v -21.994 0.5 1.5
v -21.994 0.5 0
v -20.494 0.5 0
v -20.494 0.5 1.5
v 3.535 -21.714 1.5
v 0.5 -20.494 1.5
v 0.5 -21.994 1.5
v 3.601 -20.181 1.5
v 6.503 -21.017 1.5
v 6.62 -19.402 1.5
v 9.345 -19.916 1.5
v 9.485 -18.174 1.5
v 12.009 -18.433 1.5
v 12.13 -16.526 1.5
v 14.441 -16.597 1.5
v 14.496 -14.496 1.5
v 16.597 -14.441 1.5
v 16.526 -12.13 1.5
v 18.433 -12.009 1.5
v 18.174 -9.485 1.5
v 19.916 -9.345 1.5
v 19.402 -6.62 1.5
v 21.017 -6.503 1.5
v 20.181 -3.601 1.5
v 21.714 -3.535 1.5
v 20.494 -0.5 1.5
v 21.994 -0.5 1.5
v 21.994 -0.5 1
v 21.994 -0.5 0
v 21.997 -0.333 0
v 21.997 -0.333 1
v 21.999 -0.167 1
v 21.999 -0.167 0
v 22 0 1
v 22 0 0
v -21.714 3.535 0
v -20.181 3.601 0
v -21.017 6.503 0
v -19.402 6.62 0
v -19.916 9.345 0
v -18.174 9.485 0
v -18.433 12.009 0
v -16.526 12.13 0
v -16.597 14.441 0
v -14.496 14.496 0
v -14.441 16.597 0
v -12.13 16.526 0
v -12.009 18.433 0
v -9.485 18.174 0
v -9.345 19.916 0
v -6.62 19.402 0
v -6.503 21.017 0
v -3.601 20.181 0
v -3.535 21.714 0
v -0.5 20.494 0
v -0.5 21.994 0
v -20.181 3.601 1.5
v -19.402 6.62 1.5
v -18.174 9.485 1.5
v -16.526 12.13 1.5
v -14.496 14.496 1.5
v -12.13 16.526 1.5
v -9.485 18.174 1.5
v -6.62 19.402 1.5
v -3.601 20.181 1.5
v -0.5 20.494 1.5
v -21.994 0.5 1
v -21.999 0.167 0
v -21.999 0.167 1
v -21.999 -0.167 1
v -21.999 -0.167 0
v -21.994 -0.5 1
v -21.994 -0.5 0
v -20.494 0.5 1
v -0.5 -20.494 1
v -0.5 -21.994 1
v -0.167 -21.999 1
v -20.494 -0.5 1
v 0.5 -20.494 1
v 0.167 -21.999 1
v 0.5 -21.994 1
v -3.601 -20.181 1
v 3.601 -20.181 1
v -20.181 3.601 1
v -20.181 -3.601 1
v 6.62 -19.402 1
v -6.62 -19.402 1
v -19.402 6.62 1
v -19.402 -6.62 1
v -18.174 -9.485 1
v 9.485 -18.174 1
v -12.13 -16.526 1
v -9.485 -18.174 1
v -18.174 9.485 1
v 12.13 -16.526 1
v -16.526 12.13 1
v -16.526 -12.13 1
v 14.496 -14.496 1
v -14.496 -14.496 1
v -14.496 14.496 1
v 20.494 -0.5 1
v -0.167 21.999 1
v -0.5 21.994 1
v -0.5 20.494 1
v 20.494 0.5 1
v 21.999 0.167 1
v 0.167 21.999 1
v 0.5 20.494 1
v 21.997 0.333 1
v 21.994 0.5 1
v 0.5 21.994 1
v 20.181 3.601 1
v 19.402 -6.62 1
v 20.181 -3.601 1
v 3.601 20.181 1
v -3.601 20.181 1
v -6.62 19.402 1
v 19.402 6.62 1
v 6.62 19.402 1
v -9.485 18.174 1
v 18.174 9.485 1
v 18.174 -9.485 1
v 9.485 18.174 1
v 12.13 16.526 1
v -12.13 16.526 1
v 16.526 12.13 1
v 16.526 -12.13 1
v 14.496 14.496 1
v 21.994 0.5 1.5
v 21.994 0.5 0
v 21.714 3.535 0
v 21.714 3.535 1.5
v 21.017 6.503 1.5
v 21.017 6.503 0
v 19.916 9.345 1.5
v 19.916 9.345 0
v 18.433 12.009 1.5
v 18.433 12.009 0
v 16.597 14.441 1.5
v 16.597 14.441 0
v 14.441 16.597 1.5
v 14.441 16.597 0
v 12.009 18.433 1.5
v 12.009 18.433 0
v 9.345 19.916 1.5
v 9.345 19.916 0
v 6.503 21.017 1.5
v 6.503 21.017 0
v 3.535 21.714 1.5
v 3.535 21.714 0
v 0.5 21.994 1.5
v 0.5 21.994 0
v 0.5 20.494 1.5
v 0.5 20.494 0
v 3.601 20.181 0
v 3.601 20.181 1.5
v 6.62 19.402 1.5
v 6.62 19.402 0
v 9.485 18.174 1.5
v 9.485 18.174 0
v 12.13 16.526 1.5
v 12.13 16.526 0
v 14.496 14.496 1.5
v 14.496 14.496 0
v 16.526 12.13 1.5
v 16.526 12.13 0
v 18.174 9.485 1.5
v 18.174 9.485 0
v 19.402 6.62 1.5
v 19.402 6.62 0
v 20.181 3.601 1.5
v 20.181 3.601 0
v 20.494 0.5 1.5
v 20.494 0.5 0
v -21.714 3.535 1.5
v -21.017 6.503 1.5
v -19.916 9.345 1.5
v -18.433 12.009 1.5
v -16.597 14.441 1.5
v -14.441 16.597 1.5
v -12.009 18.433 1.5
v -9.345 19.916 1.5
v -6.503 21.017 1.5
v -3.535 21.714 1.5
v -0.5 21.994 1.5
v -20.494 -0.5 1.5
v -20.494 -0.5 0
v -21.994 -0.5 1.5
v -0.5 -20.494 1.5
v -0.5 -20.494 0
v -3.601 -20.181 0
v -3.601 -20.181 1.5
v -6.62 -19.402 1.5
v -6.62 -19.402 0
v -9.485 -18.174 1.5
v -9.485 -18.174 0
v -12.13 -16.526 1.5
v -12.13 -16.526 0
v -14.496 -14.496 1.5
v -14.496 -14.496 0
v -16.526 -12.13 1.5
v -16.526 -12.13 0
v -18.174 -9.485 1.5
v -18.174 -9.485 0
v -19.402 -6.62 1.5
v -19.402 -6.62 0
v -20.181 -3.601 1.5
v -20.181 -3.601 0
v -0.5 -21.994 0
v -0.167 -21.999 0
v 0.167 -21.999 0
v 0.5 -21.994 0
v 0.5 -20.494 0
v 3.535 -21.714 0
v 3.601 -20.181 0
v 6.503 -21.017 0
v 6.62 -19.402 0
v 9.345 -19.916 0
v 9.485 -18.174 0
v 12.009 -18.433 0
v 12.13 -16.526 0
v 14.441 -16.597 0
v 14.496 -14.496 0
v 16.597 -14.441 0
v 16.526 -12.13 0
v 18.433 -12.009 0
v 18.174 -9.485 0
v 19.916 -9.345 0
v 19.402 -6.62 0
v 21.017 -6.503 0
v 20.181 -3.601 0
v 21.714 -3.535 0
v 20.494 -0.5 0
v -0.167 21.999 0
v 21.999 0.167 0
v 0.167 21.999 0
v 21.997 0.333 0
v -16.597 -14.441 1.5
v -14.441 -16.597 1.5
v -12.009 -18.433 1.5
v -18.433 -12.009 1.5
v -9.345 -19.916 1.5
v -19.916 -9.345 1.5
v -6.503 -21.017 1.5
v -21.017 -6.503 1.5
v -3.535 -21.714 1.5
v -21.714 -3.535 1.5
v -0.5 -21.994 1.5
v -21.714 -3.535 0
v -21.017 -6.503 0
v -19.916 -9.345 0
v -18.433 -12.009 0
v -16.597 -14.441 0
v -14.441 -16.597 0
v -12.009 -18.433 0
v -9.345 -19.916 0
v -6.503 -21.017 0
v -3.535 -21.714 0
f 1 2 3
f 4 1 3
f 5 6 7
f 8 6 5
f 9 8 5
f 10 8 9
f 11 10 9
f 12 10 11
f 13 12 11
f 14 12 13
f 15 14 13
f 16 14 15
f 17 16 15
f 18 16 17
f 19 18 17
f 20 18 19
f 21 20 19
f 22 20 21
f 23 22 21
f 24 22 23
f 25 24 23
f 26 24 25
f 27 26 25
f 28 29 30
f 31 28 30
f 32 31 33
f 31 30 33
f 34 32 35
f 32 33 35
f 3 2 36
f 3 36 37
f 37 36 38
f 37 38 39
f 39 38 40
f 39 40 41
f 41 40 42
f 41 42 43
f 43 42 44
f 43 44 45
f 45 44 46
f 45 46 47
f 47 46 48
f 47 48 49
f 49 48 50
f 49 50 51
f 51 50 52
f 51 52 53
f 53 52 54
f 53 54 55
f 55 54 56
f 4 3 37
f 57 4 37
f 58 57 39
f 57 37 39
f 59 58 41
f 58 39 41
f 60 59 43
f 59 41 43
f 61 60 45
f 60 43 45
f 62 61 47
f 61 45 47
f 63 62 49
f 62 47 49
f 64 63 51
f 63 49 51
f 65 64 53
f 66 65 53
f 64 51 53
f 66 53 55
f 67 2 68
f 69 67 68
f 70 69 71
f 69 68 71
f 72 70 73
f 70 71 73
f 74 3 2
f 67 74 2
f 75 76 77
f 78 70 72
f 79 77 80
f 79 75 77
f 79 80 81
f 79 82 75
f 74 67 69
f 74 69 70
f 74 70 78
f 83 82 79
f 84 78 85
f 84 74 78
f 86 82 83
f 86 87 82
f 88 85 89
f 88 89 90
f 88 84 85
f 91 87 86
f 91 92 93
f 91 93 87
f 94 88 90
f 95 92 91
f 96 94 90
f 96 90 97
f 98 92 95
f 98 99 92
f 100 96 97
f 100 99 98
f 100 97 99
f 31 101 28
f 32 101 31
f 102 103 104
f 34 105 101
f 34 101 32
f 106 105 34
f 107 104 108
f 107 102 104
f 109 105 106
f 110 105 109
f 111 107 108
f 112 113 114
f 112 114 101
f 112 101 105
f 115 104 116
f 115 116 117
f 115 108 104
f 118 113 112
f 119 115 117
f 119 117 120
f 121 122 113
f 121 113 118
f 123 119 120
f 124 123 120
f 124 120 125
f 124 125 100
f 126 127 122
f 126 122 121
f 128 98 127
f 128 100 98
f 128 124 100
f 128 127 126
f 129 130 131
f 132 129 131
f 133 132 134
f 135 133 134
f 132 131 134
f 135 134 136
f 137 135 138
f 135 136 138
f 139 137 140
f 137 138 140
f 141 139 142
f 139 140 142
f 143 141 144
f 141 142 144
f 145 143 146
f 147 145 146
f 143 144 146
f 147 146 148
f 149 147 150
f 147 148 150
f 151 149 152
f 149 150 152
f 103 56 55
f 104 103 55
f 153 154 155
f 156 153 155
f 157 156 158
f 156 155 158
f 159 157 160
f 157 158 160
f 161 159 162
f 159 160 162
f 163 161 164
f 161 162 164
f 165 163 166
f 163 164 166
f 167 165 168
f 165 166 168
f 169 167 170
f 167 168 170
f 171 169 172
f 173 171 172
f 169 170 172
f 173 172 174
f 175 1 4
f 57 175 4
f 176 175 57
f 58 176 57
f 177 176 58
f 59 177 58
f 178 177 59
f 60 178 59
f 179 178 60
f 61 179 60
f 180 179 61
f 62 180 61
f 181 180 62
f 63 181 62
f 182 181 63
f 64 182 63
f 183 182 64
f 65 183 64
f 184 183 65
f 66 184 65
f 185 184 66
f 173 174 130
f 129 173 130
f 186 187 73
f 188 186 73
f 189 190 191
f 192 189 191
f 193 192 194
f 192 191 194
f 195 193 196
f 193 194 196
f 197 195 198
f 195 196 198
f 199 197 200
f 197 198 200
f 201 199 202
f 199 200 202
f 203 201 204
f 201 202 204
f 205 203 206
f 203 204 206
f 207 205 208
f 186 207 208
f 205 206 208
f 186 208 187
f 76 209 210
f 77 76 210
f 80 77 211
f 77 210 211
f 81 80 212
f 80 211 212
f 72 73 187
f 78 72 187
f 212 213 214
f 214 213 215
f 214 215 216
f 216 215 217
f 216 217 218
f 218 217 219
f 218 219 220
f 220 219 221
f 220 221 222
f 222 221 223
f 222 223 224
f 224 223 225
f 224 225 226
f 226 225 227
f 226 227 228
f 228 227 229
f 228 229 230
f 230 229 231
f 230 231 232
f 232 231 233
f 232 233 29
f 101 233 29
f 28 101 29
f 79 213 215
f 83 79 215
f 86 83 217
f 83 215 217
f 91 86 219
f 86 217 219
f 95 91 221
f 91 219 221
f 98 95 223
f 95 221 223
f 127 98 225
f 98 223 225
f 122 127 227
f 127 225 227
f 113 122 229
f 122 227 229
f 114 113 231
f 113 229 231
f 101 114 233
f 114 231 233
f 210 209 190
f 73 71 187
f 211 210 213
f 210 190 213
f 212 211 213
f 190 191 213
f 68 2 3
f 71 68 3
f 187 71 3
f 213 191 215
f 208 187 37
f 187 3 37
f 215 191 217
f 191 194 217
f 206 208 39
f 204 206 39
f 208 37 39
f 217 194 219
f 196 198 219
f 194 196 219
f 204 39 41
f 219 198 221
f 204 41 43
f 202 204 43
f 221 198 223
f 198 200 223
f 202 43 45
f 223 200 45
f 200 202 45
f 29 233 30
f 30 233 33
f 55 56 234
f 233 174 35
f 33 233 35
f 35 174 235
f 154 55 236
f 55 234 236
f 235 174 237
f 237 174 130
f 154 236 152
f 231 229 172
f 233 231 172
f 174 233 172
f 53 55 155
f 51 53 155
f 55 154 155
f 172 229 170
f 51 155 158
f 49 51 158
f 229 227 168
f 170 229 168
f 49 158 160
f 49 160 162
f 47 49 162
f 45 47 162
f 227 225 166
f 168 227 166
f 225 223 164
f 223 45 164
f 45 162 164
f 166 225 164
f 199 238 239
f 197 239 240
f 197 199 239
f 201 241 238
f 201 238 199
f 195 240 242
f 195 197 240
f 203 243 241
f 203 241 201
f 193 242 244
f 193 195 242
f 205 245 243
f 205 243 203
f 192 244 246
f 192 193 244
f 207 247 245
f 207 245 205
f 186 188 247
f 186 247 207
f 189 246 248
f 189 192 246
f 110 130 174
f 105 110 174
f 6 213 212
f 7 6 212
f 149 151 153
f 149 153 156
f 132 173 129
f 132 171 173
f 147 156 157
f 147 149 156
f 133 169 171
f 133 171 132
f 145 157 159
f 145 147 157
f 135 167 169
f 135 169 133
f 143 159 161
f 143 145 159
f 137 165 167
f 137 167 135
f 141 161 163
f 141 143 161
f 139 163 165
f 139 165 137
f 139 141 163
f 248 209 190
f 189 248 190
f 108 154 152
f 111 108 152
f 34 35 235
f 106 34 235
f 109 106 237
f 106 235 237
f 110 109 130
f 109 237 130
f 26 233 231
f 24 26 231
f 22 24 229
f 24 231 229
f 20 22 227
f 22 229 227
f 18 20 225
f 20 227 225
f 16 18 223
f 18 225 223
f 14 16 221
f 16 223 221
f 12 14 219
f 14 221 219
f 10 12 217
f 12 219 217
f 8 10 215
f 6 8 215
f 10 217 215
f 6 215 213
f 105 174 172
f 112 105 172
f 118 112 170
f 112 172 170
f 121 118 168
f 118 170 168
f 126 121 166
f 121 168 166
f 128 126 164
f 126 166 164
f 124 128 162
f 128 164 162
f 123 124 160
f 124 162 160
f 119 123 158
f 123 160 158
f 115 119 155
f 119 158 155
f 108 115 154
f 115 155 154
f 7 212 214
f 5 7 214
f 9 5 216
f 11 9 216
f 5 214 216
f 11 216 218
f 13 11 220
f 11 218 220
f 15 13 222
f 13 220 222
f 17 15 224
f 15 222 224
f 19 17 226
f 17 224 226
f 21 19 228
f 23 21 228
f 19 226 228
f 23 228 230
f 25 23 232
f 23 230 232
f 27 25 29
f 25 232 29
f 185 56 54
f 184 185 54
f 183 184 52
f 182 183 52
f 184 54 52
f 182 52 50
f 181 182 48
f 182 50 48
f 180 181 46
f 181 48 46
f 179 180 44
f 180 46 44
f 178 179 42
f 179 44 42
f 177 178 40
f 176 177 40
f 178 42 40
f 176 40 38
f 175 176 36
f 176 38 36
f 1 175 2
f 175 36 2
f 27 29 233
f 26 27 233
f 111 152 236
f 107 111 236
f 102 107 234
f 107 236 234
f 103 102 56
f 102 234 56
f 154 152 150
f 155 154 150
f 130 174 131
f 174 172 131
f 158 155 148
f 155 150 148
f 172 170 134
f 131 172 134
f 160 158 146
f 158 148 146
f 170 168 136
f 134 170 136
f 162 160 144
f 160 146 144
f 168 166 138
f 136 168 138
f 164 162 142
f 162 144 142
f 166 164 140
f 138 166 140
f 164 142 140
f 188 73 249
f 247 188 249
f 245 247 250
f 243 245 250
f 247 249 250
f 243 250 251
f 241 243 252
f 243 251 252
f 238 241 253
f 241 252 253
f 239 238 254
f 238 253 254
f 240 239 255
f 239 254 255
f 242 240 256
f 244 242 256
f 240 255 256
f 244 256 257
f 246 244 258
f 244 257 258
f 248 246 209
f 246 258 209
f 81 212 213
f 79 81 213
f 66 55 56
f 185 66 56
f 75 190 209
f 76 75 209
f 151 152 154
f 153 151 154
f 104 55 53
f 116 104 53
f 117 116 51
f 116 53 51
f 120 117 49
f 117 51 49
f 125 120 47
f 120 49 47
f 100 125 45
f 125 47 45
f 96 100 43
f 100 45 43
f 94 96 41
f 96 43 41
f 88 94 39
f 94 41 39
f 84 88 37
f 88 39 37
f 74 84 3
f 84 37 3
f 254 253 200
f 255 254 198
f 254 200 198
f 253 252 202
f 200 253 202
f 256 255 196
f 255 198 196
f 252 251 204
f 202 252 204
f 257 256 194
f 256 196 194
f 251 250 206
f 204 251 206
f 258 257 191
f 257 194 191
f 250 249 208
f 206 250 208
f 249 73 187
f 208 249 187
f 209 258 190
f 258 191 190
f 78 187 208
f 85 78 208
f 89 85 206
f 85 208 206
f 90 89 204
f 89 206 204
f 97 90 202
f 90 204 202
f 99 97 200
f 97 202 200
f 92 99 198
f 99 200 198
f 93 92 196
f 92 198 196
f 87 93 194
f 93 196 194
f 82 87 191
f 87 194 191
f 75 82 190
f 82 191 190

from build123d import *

# Parameters (mm, degrees)
F1_DEPTH = 1.5
F2_DEPTH = 1


with BuildPart() as f1:
    # F0 (on Top) → F1 (new body)
    with BuildSketch(Plane.XY):
        with BuildLine():
            Line((-0.5, 20.493902), (-0.5, 21.994317))
            ThreePointArc((-0.5, 21.994317), (-15.556349, 15.556349), (-21.994317, 0.5))
            Line((-21.994317, 0.5), (-20.493902, 0.5))
            ThreePointArc((-20.493902, 0.5), (-14.495689, 14.495689), (-0.5, 20.493902))
        make_face()
        with BuildLine():
            ThreePointArc((-21.994317, -0.5), (-15.556349, -15.556349), (-0.5, -21.994317))
            Line((-0.5, -21.994317), (-0.5, -20.493902))
            ThreePointArc((-0.5, -20.493902), (-14.495689, -14.495689), (-20.493902, -0.5))
            Line((-20.493902, -0.5), (-21.994317, -0.5))
        make_face()
        with BuildLine():
            ThreePointArc((0.5, -21.994317), (15.556349, -15.556349), (21.994317, -0.5))
            Line((21.994317, -0.5), (20.493902, -0.5))
            ThreePointArc((20.493902, -0.5), (14.495689, -14.495689), (0.5, -20.493902))
            Line((0.5, -20.493902), (0.5, -21.994317))
        make_face()
        with BuildLine():
            Line((20.493902, 0.5), (21.994317, 0.5))
            ThreePointArc((21.994317, 0.5), (15.556349, 15.556349), (0.5, 21.994317))
            Line((0.5, 21.994317), (0.5, 20.493902))
            ThreePointArc((0.5, 20.493902), (14.495689, 14.495689), (20.493902, 0.5))
        make_face()
    extrude(amount=F1_DEPTH)


with BuildPart() as f2:
    # F0 (on Top) → F2 (new body)
    with BuildSketch(Plane.XY):
        with BuildLine():
            ThreePointArc((-0.5, -21.994317), (0, -22), (0.5, -21.994317))
            Line((0.5, -21.994317), (0.5, -20.493902))
            ThreePointArc((0.5, -20.493902), (0, -20.5), (-0.5, -20.493902))
            Line((-0.5, -20.493902), (-0.5, -21.994317))
        make_face()
        with BuildLine():
            Line((-20.493902, 0.5), (-21.994317, 0.5))
            ThreePointArc((-21.994317, 0.5), (-22, 0), (-21.994317, -0.5))
            Line((-21.994317, -0.5), (-20.493902, -0.5))
            ThreePointArc((-20.493902, -0.5), (-20.5, 0), (-20.493902, 0.5))
        make_face()
        with BuildLine():
            ThreePointArc((21.994317, -0.5), (21.998579, -0.250016), (22, 0))
            ThreePointArc((22, 0), (21.998579, 0.250016), (21.994317, 0.5))
            Line((21.994317, 0.5), (20.493902, 0.5))
            ThreePointArc((20.493902, 0.5), (20.498475, 0.250019), (20.5, 0))
            ThreePointArc((20.5, 0), (20.498475, -0.250019), (20.493902, -0.5))
            Line((20.493902, -0.5), (21.994317, -0.5))
        make_face()
        with BuildLine():
            Line((0.5, 20.493902), (0.5, 21.994317))
            ThreePointArc((0.5, 21.994317), (0, 22), (-0.5, 21.994317))
            Line((-0.5, 21.994317), (-0.5, 20.493902))
            ThreePointArc((-0.5, 20.493902), (0, 20.5), (0.5, 20.493902))
        make_face()
        with BuildLine():
            ThreePointArc((20.5, 0), (20.498475, 0.250019), (20.493902, 0.5))
            ThreePointArc((20.493902, 0.5), (14.495689, 14.495689), (0.5, 20.493902))
            ThreePointArc((0.5, 20.493902), (0, 20.5), (-0.5, 20.493902))
            ThreePointArc((-0.5, 20.493902), (-14.495689, 14.495689), (-20.493902, 0.5))
            ThreePointArc((-20.493902, 0.5), (-20.5, 0), (-20.493902, -0.5))
            ThreePointArc((-20.493902, -0.5), (-14.495689, -14.495689), (-0.5, -20.493902))
            ThreePointArc((-0.5, -20.493902), (0, -20.5), (0.5, -20.493902))
            ThreePointArc((0.5, -20.493902), (14.495689, -14.495689), (20.493902, -0.5))
            ThreePointArc((20.493902, -0.5), (20.498475, -0.250019), (20.5, 0))
        make_face()
    extrude(amount=F2_DEPTH)


solid = Compound([f1.part, f2.part])
